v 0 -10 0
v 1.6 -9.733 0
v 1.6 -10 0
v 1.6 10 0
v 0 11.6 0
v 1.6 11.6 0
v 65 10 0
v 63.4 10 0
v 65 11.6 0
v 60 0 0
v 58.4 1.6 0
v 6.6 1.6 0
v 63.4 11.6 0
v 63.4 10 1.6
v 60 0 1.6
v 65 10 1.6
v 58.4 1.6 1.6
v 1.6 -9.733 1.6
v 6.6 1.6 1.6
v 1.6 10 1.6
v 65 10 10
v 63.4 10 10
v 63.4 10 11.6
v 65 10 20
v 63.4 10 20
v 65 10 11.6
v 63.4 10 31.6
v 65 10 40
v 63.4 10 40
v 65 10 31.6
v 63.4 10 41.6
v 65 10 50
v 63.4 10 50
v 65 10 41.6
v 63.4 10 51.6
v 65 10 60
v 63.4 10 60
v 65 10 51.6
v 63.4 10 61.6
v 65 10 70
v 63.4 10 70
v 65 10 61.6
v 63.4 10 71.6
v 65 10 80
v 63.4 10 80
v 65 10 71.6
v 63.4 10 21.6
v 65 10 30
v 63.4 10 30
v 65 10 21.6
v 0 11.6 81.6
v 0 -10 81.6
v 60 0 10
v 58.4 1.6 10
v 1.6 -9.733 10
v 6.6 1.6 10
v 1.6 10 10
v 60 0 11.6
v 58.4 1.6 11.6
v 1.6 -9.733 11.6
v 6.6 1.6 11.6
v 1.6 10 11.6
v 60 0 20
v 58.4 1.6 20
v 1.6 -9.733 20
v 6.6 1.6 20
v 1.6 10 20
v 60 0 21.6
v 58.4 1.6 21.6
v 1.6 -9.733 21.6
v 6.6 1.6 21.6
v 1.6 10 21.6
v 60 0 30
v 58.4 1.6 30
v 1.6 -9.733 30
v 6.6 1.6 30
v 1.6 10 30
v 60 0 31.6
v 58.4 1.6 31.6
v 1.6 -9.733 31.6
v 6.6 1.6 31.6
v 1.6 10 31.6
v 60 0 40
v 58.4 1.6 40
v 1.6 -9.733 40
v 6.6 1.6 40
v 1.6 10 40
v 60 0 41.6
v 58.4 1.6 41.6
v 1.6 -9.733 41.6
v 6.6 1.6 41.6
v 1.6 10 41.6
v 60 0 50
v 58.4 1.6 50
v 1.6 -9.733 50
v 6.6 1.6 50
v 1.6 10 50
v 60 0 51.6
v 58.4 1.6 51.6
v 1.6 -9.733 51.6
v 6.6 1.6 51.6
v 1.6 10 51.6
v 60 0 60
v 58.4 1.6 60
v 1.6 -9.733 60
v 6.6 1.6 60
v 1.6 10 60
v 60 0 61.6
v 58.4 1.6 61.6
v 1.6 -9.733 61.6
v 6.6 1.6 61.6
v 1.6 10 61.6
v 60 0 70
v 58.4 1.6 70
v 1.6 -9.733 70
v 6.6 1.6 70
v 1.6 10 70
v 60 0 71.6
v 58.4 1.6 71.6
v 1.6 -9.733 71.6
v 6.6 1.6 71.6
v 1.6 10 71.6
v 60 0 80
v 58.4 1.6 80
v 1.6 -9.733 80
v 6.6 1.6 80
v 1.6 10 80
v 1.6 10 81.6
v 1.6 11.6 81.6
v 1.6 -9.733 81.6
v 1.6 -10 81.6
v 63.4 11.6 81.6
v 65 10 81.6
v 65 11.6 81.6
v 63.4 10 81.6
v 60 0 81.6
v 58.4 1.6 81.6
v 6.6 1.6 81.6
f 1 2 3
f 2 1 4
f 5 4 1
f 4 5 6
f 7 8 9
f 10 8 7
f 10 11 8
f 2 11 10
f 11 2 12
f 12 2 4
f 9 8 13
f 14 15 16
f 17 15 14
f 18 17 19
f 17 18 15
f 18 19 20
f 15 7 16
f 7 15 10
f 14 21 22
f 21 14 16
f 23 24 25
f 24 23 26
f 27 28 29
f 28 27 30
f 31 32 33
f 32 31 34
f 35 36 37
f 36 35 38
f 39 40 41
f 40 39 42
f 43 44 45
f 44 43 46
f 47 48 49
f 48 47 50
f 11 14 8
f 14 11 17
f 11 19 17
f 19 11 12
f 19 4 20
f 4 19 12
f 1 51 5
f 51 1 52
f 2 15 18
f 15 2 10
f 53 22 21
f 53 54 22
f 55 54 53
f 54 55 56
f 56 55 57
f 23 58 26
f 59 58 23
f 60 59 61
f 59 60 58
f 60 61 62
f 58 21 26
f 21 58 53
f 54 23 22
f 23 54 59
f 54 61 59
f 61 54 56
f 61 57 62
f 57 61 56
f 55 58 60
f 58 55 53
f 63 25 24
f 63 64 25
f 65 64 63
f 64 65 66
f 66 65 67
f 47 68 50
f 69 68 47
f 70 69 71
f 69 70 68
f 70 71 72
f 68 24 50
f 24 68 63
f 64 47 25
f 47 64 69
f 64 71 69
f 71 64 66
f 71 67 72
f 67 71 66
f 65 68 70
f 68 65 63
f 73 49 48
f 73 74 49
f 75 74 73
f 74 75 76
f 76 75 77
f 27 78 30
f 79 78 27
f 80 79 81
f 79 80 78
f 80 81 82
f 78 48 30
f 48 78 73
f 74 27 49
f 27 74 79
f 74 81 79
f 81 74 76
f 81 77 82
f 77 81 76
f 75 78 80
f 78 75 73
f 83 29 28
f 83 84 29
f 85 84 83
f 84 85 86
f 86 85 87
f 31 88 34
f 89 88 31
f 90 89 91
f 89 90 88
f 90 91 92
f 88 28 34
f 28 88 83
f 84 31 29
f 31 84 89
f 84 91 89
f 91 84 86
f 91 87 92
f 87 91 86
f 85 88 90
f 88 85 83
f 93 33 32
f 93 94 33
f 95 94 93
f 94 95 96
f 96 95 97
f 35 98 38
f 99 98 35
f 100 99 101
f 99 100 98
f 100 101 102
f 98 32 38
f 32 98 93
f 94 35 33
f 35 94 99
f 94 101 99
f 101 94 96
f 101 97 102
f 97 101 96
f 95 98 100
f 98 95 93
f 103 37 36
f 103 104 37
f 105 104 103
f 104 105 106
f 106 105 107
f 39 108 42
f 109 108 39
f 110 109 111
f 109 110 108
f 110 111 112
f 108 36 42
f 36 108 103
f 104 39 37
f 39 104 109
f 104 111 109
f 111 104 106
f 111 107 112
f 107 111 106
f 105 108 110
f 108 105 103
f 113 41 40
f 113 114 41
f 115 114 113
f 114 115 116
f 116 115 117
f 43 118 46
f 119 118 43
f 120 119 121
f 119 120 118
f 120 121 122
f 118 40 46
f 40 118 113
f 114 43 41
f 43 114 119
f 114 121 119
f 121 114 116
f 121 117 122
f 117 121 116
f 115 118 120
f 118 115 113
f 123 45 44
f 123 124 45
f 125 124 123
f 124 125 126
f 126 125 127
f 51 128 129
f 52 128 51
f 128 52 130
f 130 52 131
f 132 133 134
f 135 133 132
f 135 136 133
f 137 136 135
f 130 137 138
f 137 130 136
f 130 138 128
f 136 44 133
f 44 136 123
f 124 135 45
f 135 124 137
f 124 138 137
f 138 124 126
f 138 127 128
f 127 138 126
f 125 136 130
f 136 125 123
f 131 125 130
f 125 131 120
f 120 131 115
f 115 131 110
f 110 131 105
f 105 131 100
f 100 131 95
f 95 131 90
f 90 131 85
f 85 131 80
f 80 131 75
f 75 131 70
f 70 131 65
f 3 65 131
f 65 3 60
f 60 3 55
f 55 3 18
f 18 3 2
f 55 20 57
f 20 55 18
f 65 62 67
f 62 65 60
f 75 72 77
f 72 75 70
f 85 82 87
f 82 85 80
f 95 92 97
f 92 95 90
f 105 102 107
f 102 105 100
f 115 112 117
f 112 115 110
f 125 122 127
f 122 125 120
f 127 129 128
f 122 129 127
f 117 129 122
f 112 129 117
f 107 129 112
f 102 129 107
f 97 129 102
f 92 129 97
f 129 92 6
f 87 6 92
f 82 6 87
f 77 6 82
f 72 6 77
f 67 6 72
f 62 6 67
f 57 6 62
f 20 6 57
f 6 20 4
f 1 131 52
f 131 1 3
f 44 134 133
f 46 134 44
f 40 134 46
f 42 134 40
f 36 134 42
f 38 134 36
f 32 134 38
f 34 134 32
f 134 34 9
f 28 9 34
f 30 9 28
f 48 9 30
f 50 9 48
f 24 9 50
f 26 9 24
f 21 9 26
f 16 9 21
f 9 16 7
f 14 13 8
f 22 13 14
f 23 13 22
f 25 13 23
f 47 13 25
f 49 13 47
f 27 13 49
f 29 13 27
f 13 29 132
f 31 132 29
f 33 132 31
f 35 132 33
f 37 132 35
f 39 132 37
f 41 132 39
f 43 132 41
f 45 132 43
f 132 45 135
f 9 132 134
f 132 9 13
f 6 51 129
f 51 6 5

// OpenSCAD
union() {
    hh=10;
    ll=65;
    dd=1.6;
    leng=80;

    for( len=[0:10:leng] ) {
        translate( [0,0,len] ) {
            linear_extrude( height=dd )
                polygon (
                        points=[
                        [0, hh],[dd,hh],
                        [dd+5,dd], [ll-5-dd,dd],
                        [ll-dd,hh],[ll, hh],
                        [ll-5, 0],[0, -hh]
                        ]
                        );
        }
    }
    translate( [0,hh-20,0] )
        cube([dd,20,leng+dd]);
    translate( [ll-dd,hh,0] )
        cube([dd,dd,leng+dd]);
    translate( [0,hh,0] )
        cube([dd,dd,leng+dd]);
}
